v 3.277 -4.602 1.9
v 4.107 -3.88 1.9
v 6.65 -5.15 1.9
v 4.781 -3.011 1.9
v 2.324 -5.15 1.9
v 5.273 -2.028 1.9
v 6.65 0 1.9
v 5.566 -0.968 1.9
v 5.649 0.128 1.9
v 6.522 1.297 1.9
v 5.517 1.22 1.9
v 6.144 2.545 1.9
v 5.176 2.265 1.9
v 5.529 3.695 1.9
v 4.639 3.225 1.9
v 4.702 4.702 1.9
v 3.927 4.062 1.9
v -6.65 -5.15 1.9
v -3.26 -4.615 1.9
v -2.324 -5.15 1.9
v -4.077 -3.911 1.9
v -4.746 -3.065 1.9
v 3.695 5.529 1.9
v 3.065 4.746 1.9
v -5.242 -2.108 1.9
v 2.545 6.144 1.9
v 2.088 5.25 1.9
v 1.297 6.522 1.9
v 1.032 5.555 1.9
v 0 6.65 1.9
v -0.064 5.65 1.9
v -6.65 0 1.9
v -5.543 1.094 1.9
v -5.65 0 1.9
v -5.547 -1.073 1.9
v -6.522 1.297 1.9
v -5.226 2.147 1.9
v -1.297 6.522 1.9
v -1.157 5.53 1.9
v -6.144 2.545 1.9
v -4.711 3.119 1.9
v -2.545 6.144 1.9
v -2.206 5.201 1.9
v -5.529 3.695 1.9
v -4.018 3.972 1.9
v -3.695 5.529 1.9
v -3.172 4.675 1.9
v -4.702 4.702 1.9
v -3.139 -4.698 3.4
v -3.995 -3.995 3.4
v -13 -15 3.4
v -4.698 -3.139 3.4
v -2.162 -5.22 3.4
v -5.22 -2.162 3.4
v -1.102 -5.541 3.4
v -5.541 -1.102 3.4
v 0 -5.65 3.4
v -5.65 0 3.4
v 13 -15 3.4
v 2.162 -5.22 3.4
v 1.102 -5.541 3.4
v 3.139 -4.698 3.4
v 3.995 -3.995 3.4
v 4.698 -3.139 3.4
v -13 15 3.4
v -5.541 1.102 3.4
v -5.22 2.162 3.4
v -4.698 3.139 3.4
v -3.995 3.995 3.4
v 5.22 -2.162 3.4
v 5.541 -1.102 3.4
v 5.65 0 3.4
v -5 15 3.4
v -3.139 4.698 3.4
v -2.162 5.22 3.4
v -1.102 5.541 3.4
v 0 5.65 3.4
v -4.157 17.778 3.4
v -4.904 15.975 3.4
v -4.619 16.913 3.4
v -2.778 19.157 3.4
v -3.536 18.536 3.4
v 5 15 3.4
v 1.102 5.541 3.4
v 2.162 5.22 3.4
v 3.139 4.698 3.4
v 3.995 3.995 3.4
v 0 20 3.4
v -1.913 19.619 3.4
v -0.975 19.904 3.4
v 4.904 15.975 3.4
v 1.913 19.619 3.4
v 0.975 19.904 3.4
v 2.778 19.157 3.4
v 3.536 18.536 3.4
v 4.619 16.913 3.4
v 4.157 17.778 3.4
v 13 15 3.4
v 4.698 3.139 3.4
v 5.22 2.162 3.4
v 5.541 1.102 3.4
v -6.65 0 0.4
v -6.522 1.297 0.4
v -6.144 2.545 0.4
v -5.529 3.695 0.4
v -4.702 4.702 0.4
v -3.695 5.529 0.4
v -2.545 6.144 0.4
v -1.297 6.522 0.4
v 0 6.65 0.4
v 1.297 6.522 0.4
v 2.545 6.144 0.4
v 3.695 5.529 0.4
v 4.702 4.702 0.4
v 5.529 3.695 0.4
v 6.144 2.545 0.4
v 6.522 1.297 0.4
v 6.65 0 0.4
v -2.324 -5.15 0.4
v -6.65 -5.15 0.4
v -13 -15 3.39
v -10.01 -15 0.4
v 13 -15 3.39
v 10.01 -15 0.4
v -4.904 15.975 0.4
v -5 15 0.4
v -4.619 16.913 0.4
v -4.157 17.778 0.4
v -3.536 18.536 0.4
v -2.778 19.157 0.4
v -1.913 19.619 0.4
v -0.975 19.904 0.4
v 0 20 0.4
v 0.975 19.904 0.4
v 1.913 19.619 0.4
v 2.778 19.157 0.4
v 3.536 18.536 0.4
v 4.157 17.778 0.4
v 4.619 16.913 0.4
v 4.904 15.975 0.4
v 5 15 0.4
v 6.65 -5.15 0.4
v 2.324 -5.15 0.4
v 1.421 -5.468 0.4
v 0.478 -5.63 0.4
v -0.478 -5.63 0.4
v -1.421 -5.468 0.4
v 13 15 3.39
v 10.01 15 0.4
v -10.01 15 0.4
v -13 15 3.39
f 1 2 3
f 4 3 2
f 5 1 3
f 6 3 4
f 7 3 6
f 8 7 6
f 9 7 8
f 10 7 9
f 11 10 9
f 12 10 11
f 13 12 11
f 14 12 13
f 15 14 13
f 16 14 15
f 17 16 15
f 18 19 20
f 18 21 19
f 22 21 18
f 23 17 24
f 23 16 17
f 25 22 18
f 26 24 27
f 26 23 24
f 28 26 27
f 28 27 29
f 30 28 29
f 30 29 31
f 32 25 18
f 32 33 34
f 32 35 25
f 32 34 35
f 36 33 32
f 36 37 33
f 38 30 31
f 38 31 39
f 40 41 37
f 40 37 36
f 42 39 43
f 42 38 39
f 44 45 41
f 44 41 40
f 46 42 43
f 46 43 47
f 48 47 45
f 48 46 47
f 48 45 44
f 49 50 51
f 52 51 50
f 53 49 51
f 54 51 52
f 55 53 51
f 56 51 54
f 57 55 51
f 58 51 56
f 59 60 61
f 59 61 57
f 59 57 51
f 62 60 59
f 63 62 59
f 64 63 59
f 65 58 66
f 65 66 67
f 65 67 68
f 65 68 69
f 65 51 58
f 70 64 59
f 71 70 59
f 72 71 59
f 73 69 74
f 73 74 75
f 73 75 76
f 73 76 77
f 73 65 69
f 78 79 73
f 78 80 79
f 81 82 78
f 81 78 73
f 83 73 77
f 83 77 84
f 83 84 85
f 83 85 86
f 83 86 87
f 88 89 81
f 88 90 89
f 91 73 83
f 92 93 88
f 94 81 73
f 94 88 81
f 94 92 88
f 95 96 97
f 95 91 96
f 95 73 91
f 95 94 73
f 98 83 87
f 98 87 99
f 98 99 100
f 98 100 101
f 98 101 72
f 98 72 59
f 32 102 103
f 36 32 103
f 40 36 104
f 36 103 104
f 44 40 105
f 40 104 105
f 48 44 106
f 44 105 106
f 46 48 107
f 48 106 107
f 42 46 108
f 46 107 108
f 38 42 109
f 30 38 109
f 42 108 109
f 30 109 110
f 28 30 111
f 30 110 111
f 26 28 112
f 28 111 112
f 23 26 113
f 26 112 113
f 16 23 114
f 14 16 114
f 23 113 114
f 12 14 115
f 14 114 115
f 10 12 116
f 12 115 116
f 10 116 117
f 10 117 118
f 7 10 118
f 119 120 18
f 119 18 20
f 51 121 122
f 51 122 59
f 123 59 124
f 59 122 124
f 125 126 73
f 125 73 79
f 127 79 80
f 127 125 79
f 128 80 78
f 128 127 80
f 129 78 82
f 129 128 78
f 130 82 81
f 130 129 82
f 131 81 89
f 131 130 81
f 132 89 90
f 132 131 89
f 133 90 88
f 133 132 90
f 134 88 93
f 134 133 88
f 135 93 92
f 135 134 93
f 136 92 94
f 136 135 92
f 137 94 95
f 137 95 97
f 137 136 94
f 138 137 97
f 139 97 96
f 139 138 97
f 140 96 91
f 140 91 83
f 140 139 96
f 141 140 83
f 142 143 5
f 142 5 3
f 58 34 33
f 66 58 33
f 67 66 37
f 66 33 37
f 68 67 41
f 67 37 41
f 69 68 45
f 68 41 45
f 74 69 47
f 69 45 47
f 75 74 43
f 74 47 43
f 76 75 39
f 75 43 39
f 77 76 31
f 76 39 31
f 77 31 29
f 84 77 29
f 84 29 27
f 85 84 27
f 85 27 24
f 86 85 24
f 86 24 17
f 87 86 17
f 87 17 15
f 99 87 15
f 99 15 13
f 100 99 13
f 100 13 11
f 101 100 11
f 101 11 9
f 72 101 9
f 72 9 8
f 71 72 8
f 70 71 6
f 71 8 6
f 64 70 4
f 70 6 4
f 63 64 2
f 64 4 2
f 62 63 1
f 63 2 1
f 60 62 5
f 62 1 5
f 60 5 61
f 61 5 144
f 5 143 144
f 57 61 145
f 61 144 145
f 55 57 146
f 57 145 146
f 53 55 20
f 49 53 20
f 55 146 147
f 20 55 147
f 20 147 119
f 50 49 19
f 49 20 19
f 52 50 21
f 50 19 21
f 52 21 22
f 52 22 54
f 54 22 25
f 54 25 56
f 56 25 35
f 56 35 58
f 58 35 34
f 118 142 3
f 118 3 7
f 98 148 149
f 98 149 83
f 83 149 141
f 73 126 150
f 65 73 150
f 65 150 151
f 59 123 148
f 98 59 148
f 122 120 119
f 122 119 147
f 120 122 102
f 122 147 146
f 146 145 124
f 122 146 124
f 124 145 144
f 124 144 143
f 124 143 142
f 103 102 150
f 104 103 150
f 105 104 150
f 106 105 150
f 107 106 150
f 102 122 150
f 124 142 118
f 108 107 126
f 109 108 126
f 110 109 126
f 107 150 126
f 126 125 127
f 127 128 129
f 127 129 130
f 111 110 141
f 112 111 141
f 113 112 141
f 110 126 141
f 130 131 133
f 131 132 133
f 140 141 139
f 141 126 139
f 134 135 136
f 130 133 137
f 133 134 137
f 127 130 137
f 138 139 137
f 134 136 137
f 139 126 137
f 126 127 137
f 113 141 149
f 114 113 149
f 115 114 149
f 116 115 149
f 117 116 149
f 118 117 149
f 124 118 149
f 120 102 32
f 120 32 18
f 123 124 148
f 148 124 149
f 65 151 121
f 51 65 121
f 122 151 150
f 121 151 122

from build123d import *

# Parameters (mm, degrees)
PAD028_DEPTH            = 3
POCKET013_DEPTH         = 1.5
CHAMFER_SIZE            = 2.99
SKETCH061_R             = 5.65
POCKET017_DEPTH         = 3.001
BODY019_PLACEMENT_ANGLE = 180


with BuildPart() as part:
    # Sketch057 → Pad028 (new body)
    with BuildSketch(Plane.XY):
        with BuildLine():
            Line((-13, 15), (-5, 15))
            ThreePointArc((5, 15), (0, 20), (-5, 15))
            Line((5, 15), (13, 15))
            Line((13, 15), (13, -15))
            Line((13, -15), (-13, -15))
            Line((-13, -15), (-13, 15))
        make_face()
    extrude(amount=-PAD028_DEPTH)

    # Sketch056 → Pocket013 (cut)
    with BuildSketch(Plane.XY):
        with BuildLine():
            ThreePointArc((6.65, 0), (0, 6.65), (-6.65, 0))
            Line((-6.65, -5.15), (-6.65, 0))
            Line((6.65, -5.15), (-6.65, -5.15))
            Line((6.65, 0), (6.65, -5.15))
        make_face()
    extrude(amount=-POCKET013_DEPTH, mode=Mode.SUBTRACT)

    # Chamfer
    chamfer_edges = [part.edges().sort_by_distance(p)[0] for p in [
        (-13, 0, 0),
        (13, 0, 0),
    ]]
    chamfer(chamfer_edges, length=CHAMFER_SIZE)

    # Sketch061 → Pocket017 (cut, through all)
    with BuildSketch(Plane.XY):
        Circle(SKETCH061_R)
    extrude(amount=-POCKET017_DEPTH, mode=Mode.SUBTRACT)


with BuildPart() as part_1:
    # Body019 placement: moved
    add(part.part.moved(Location((0, 0, 0.4))).rotate(Axis((0, 0, 0.4), (0, 1, 0)), BODY019_PLACEMENT_ANGLE))


solid = part_1.part
